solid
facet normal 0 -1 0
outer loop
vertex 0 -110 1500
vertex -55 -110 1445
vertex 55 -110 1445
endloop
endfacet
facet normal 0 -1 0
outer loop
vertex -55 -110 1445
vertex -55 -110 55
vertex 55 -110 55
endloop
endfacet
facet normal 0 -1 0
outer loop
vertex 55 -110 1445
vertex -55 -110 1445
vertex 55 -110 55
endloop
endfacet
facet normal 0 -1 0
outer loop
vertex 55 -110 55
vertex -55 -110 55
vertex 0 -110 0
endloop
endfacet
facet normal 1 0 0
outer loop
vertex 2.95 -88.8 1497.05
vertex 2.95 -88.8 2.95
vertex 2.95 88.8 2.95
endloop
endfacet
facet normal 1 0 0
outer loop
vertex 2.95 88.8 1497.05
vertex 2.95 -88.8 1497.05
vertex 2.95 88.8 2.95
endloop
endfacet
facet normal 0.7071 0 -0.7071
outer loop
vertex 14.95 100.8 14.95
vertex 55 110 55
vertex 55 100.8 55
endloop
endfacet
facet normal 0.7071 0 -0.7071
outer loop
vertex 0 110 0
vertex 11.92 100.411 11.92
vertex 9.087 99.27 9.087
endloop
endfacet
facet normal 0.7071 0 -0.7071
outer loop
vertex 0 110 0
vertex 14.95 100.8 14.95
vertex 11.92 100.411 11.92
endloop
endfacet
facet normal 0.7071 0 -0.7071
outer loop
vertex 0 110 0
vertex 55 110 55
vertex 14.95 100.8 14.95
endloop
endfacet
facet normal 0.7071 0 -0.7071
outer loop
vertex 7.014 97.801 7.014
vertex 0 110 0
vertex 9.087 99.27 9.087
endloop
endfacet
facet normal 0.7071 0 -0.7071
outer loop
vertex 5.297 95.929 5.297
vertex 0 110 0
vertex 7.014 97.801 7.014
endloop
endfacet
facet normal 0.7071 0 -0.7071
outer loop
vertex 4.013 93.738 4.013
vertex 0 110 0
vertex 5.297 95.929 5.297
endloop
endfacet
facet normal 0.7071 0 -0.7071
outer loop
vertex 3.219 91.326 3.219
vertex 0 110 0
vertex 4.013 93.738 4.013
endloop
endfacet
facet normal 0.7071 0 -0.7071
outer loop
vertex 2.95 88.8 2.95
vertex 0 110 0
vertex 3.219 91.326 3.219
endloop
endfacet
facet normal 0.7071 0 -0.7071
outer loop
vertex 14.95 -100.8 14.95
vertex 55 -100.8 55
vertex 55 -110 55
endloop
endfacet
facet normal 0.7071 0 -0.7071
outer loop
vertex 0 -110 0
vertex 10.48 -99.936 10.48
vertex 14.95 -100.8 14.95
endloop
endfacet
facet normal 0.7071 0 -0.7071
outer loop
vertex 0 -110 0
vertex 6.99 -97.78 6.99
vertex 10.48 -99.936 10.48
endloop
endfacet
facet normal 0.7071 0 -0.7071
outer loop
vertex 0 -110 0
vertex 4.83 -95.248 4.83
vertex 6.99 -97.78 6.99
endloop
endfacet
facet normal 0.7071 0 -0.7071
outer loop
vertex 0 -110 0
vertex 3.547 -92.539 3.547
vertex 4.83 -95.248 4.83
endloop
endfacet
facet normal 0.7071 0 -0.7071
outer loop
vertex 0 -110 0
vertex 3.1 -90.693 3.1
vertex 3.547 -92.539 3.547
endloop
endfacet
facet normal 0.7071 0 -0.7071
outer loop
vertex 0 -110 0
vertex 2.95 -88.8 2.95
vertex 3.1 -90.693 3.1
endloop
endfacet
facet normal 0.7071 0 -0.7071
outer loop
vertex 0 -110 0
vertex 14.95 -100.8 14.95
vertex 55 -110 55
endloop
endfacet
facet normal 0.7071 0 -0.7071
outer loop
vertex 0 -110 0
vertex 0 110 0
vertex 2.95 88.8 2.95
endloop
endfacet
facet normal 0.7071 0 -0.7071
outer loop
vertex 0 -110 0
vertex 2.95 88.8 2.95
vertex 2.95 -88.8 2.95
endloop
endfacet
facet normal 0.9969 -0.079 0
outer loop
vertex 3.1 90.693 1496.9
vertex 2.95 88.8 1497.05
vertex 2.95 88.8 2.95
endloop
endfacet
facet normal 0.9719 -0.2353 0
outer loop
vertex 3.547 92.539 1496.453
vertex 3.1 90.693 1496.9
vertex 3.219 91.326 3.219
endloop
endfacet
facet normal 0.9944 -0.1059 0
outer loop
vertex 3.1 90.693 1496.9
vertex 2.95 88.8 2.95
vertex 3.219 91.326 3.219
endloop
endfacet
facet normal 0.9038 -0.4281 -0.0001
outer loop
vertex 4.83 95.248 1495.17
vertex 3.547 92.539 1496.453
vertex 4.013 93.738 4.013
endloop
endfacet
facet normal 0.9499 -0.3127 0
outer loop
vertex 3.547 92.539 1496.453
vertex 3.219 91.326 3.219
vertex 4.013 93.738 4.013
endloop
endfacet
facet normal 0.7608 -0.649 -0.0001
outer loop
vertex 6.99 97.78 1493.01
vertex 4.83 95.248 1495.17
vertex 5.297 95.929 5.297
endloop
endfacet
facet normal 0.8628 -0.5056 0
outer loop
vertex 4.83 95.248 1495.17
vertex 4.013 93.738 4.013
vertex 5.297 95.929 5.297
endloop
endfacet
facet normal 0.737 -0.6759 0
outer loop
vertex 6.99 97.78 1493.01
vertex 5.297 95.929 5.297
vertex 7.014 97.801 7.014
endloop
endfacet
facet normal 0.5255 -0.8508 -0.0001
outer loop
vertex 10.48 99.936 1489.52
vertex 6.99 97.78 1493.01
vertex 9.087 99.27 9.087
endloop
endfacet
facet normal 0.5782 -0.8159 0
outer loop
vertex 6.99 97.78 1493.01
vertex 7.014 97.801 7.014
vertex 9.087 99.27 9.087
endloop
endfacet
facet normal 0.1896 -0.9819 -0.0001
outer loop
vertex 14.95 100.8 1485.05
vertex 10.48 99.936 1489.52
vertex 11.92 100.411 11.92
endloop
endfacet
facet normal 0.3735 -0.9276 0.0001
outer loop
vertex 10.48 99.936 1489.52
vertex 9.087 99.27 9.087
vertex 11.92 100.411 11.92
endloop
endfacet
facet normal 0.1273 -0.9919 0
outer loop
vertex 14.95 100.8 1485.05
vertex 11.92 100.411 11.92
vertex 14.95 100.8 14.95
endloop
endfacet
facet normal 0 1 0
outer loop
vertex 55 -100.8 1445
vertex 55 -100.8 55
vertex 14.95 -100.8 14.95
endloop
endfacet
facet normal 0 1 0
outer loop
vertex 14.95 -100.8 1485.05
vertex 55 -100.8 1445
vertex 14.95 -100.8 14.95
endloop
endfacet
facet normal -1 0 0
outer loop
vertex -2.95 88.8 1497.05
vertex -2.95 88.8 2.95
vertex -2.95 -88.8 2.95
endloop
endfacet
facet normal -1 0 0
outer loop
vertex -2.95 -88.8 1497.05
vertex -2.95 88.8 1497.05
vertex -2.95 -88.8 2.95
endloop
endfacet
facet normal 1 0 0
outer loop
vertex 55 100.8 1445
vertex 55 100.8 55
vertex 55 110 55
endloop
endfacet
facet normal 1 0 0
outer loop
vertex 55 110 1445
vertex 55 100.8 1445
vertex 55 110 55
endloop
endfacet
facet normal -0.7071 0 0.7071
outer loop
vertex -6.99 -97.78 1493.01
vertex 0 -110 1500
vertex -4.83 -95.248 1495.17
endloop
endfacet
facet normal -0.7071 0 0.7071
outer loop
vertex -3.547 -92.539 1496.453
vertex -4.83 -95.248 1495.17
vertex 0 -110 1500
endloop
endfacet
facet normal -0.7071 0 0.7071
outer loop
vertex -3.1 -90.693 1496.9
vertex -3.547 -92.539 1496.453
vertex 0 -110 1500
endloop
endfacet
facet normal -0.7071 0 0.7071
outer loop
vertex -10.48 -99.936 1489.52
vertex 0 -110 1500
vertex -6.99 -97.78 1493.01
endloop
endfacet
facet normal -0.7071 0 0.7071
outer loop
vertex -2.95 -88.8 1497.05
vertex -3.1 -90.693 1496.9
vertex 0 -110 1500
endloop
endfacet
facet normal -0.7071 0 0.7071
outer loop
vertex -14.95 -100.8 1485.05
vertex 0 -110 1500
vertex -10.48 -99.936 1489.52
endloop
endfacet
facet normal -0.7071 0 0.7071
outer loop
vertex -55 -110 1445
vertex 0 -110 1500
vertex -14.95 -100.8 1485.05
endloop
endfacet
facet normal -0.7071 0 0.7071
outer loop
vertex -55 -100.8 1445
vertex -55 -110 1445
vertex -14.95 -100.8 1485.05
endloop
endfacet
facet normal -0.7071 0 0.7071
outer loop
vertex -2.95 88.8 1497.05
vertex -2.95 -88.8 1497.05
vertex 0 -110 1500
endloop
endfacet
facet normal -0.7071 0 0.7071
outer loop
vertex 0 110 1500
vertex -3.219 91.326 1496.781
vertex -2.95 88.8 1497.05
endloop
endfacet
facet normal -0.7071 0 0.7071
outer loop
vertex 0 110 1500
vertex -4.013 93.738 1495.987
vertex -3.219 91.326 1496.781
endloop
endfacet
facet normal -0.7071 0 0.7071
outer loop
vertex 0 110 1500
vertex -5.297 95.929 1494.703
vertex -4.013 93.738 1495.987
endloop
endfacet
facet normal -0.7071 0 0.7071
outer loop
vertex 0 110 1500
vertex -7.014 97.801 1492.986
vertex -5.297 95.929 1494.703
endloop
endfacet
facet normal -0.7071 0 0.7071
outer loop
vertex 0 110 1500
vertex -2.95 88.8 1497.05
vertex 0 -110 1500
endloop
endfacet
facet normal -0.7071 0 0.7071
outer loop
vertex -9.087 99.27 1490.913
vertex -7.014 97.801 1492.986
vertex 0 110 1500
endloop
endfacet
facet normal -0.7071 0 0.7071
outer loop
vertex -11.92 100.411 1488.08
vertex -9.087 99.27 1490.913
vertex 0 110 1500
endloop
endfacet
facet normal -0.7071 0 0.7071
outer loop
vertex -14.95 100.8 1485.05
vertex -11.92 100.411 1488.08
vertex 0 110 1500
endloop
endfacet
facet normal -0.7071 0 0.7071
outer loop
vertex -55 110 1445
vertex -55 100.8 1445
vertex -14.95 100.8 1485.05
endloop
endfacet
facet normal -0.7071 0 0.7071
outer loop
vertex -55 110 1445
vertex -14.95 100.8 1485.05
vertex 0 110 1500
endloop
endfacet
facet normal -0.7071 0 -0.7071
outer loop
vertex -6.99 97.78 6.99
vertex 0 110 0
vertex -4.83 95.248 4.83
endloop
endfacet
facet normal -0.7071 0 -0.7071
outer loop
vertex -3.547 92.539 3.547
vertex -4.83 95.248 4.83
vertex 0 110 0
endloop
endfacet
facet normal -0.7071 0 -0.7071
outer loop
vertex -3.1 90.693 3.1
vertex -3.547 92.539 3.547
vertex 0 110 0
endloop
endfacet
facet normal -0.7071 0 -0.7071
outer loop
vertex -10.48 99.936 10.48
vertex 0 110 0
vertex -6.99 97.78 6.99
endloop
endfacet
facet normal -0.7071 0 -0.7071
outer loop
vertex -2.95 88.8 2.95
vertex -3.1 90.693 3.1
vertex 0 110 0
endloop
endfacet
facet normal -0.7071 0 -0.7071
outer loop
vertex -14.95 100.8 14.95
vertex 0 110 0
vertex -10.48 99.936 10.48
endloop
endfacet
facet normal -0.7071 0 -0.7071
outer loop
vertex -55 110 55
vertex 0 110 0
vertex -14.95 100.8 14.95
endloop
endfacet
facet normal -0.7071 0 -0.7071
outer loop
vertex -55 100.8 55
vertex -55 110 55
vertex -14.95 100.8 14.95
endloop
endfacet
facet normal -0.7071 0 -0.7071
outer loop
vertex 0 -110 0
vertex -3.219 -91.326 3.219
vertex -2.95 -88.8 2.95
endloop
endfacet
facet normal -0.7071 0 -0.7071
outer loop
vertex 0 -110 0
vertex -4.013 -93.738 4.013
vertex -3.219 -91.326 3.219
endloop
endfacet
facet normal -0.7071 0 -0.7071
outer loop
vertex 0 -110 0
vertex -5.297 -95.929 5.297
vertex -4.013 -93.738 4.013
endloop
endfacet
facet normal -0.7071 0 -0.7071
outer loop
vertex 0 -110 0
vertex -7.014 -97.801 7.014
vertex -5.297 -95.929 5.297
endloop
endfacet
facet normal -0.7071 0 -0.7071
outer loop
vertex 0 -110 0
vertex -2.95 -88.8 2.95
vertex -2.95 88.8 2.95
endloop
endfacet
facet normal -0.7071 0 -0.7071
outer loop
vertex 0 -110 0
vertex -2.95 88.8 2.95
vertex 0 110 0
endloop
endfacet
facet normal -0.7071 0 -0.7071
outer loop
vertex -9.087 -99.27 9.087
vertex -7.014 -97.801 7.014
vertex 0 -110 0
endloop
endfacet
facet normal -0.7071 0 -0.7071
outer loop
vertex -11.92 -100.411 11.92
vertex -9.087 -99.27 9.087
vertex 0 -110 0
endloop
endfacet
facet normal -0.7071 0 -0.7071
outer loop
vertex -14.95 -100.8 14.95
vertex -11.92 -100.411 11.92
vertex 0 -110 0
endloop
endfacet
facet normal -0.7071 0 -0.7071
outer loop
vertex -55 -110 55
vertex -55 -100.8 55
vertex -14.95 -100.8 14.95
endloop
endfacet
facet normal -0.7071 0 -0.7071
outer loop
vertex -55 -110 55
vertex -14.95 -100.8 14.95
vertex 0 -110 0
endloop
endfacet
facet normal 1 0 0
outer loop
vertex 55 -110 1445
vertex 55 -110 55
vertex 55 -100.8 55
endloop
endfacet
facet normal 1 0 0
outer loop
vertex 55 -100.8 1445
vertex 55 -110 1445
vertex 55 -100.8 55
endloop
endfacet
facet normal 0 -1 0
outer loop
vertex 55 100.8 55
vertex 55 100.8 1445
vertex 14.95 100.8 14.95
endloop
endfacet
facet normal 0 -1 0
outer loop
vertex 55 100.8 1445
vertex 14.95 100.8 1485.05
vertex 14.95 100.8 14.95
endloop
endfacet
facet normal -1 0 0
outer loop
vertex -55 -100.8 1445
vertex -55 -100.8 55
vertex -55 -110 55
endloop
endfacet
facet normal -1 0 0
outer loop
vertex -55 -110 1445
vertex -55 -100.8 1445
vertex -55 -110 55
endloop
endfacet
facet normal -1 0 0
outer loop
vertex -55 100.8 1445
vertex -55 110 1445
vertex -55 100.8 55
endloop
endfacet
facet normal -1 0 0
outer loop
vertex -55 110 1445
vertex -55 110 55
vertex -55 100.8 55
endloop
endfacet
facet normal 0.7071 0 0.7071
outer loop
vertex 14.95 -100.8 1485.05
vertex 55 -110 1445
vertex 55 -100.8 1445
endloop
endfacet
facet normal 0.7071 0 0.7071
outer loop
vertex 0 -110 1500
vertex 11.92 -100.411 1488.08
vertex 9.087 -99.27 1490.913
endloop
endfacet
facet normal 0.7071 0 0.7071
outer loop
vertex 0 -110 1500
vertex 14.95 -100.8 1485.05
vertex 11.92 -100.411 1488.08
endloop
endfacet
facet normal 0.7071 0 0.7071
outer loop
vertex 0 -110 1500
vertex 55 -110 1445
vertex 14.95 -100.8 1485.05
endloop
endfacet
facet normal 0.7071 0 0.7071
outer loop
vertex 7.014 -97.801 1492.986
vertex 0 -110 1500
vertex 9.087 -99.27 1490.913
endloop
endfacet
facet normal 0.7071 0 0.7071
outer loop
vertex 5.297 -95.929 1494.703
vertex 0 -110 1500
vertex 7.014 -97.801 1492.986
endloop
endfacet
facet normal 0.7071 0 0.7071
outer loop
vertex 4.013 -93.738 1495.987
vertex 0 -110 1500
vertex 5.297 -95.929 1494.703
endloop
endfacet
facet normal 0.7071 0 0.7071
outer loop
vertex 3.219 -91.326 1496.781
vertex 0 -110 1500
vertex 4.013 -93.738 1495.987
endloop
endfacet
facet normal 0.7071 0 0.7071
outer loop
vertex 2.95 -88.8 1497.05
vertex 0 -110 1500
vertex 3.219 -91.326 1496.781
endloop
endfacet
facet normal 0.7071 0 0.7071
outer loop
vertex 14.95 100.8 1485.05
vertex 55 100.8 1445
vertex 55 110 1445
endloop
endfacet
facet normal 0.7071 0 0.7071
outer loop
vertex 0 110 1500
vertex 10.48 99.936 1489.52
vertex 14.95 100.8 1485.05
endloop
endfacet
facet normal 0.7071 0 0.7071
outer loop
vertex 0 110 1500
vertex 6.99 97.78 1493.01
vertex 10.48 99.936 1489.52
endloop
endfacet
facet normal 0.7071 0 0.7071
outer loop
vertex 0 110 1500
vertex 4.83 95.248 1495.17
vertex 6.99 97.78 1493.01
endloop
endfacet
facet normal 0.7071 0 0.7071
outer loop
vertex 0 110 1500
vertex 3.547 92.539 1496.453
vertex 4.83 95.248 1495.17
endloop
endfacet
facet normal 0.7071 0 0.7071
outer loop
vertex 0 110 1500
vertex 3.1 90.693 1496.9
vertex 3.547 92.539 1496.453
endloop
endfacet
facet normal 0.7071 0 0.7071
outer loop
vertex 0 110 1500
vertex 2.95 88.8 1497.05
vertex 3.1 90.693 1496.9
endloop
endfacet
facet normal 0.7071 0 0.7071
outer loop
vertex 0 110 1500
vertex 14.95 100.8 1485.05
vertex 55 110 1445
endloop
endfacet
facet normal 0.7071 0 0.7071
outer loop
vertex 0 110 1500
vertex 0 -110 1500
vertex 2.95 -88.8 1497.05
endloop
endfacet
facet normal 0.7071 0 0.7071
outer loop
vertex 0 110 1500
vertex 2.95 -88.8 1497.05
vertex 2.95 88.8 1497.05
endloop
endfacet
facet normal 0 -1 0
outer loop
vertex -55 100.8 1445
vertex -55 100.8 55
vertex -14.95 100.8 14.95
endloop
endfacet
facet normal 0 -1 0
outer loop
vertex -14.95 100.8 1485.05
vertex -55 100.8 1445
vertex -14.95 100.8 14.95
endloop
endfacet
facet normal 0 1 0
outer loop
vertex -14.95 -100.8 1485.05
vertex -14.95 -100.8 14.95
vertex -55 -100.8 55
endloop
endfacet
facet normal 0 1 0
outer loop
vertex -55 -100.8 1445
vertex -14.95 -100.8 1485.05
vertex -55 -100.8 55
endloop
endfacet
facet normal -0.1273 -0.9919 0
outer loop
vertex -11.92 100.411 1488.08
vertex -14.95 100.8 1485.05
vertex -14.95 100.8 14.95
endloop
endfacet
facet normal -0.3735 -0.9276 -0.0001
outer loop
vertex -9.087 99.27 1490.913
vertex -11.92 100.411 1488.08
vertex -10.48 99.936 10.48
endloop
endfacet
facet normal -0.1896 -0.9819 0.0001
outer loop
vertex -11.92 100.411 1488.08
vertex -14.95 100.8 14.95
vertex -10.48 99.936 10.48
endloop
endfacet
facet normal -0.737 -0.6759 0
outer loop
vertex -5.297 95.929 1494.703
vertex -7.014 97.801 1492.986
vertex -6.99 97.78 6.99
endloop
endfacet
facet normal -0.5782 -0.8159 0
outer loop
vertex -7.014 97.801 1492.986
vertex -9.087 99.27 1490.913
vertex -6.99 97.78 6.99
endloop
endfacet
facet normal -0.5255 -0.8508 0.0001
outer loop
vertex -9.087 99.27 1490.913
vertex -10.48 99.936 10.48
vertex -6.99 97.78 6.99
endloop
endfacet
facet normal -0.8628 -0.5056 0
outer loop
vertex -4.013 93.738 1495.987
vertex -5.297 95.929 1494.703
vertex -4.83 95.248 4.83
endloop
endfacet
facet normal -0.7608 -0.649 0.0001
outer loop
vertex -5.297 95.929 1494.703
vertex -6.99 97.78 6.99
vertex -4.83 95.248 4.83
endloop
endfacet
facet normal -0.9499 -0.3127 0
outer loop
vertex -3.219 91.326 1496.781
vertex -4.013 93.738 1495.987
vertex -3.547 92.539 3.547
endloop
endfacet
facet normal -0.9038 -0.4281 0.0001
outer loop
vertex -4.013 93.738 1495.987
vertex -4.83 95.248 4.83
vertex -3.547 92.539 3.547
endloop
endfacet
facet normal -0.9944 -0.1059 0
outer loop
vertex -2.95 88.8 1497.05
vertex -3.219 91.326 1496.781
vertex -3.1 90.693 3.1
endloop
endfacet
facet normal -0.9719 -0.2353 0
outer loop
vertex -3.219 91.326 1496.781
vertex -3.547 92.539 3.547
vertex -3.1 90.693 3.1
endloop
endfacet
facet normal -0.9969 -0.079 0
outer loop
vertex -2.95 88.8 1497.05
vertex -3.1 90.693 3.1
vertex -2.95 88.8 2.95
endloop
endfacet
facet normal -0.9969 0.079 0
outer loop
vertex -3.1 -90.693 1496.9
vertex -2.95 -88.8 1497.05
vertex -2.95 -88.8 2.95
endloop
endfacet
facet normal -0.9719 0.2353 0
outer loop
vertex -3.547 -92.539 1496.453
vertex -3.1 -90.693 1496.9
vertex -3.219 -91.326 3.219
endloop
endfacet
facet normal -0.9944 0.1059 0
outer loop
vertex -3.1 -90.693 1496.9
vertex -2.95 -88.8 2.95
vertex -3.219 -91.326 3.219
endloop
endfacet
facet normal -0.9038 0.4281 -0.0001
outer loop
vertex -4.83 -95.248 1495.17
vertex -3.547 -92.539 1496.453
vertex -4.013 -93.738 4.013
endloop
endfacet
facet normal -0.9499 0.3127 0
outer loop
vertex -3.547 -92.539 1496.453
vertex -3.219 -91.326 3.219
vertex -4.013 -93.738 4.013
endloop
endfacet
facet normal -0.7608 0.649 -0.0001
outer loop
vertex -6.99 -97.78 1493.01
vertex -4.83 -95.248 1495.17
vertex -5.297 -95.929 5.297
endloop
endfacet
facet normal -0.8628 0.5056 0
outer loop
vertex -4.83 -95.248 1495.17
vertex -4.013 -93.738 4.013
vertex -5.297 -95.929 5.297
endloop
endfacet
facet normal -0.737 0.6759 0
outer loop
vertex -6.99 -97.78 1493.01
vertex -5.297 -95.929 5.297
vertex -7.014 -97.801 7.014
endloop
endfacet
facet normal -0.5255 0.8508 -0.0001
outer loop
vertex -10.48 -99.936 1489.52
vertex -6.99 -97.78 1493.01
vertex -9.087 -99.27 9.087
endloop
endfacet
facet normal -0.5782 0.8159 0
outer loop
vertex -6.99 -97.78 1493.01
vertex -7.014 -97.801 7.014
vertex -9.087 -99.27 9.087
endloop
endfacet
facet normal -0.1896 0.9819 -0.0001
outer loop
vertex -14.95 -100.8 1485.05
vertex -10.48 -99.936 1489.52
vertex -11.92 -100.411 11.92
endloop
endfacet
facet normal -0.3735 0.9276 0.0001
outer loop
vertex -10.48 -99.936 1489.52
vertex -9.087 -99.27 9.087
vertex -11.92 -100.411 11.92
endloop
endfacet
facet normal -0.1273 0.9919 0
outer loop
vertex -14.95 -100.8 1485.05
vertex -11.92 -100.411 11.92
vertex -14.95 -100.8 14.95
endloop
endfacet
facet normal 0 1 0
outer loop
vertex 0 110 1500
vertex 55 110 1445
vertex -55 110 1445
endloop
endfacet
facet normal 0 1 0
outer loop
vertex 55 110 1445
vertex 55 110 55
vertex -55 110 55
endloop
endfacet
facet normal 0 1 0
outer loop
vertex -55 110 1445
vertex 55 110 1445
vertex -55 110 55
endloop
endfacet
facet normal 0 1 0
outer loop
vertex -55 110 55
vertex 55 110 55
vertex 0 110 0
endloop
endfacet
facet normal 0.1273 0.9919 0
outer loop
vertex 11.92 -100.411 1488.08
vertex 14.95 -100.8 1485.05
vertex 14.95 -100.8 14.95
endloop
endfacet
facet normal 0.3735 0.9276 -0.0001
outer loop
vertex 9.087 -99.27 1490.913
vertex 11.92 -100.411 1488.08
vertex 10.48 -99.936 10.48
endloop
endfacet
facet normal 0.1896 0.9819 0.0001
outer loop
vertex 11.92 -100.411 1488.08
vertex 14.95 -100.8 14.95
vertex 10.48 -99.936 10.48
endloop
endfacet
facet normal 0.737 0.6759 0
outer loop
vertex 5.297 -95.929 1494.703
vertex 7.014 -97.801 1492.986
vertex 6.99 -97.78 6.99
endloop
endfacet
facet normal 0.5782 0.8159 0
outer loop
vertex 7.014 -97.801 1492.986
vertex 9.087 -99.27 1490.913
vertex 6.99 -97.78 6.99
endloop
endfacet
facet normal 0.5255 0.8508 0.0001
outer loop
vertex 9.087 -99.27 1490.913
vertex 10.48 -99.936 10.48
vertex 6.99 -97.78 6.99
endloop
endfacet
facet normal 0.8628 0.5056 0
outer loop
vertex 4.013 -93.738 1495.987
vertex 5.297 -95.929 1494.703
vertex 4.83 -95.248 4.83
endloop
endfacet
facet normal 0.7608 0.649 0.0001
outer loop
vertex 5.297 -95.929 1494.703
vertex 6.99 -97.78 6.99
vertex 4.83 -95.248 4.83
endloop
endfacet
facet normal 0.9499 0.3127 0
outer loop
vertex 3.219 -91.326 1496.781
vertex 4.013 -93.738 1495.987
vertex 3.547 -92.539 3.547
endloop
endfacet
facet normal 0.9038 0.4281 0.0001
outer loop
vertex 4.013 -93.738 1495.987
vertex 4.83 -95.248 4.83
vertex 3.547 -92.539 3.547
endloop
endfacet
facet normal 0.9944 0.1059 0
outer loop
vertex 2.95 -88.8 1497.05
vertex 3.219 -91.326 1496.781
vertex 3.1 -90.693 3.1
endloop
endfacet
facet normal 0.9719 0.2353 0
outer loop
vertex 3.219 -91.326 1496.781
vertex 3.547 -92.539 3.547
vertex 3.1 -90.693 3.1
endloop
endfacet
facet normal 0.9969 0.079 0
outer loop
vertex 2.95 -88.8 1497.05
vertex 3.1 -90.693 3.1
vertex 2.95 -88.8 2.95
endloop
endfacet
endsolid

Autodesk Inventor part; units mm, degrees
ref_plane "Start plane" through (0, 0, 0) normal (0, 0, 1) x (1, 0, 0)
ref_plane "End plane" through (0, 0, 1500) normal (0, 0, 1) x (1, 0, 0)
sketch "Sketch2" plane through (0, 0, 0) normal (0, 0, 1) x (1, 0, 0)
  line L0 (-55, 100.8) -> (-14.95, 100.8)
  line L1 (-55, 110) -> (-55, 100.8)
  line L2 (55, 110) -> (-55, 110)
  line L3 (55, 100.8) -> (55, 110)
  line L4 (14.95, 100.8) -> (55, 100.8)
  line L5 (2.95, -88.8) -> (2.95, 88.8)
  line L6 (55, -100.8) -> (14.95, -100.8)
  line L7 (55, -110) -> (55, -100.8)
  line L8 (-55, -100.8) -> (-55, -110)
  line L9 (-14.95, -100.8) -> (-55, -100.8)
  line L10 (-2.95, 88.8) -> (-2.95, -88.8)
  line L11 (0, -154) -> (0, 154) construction
  line L12 (-2.95, -100.8) -> (2.95, -100.8) construction
  arc A0 (-14.95, -100.8) -> (-2.95, -88.8) centre (-14.95, -88.8) ccw
  arc A1 (-2.95, 88.8) -> (-14.95, 100.8) centre (-14.95, 88.8) ccw
  arc A2 (14.95, 100.8) -> (2.95, 88.8) centre (14.95, 88.8) ccw
  arc A3 (2.95, -88.8) -> (14.95, -100.8) centre (14.95, -88.8) ccw
  line L13 (-77, 0) -> (77, 0) construction
  line L14 (-55, -110) -> (55, -110)
  point P0 (-2.95, 100.8)
  point P1 (2.95, 100.8)
  point P2 (0, 0)
  point P3 (0, -100.8)
  point P4 (0, 0)
  dimension "d1" = 220
  dimension "d3" = 9.2
  dimension "d5" = 5.9
  dimension "d7" = 110
  dimension "d13" = 12
  dimension "d14" = 110
  dimension "d15" = 55
extrude "Body" add sketch "Sketch2" along normal up to surface (1500 mm away) from surface at 0
sketch "Sketch3" plane through (0, 0, 0) normal (0, 0, 1) x (1, 0, 0)
  line L0 (0, 0) -> (10, 0)
ref_plane "Work Plane3" through (0, 0, 0) normal (0, -1, 0) x (1, 0, 0)
ref_plane "Work Plane4" through (-55, 0, -55) normal (0.7071, 0, -0.7071) x (-0.7071, 0, -0.7071)
split "Split1" plane through (-55, 0, -55) removes the side toward (0.7071, 0, -0.7071)
ref_plane "Work Plane5" through (55, 0, -55) normal (-0.7071, 0, -0.7071) x (-0.7071, 0, 0.7071)
split "Split2" plane through (55, 0, -55) removes the side toward (-0.7071, 0, -0.7071)
ref_plane "Work Plane6" through (55, 0, 1555) normal (-0.7071, 0, 0.7071) x (0.7071, 0, 0.7071)
split "Split3" plane through (55, 0, 1555) removes the side toward (-0.7071, 0, 0.7071)
ref_plane "Work Plane7" through (-55, 0, 1555) normal (0.7071, 0, 0.7071) x (0.7071, 0, -0.7071)
split "Split4" plane through (-55, 0, 1555) removes the side toward (0.7071, 0, 0.7071)
sketch "Sketch4" plane through (0, 0, 0) normal (0, -1, 0) x (1, 0, 0)
  line L0 (-2, 0) -> (12, 0) projected
  line L1 (-2, 1500) -> (12, 1500) projected
  dimension "d19" = 1500
equation "\"d1\" = ParH"
equation "\"d3\" = t2"
equation "\"d5\" = t1"
equation "\"d7\" = b"
equation "\"d13\" = R1"
equation "\"d14\" = 0.5 * d1"
equation "\"d15\" = 0.5 * d7"
equation "\"d8\" = G_L"
equation "\"b\" = 110"
equation "\"ParH\" = 220"
equation "\"R1\" = 12"
equation "\"G_L\" = d19"
equation "\"t1\" = 5.9"
equation "\"t2\" = 9.2"
equation "\"G_OFFSET_START\" = 0"
equation "\"G_OFFSET_END\" = 0"
properties part number "DIN 1025 - IPE 220-1500" material "Steel, Mild"
